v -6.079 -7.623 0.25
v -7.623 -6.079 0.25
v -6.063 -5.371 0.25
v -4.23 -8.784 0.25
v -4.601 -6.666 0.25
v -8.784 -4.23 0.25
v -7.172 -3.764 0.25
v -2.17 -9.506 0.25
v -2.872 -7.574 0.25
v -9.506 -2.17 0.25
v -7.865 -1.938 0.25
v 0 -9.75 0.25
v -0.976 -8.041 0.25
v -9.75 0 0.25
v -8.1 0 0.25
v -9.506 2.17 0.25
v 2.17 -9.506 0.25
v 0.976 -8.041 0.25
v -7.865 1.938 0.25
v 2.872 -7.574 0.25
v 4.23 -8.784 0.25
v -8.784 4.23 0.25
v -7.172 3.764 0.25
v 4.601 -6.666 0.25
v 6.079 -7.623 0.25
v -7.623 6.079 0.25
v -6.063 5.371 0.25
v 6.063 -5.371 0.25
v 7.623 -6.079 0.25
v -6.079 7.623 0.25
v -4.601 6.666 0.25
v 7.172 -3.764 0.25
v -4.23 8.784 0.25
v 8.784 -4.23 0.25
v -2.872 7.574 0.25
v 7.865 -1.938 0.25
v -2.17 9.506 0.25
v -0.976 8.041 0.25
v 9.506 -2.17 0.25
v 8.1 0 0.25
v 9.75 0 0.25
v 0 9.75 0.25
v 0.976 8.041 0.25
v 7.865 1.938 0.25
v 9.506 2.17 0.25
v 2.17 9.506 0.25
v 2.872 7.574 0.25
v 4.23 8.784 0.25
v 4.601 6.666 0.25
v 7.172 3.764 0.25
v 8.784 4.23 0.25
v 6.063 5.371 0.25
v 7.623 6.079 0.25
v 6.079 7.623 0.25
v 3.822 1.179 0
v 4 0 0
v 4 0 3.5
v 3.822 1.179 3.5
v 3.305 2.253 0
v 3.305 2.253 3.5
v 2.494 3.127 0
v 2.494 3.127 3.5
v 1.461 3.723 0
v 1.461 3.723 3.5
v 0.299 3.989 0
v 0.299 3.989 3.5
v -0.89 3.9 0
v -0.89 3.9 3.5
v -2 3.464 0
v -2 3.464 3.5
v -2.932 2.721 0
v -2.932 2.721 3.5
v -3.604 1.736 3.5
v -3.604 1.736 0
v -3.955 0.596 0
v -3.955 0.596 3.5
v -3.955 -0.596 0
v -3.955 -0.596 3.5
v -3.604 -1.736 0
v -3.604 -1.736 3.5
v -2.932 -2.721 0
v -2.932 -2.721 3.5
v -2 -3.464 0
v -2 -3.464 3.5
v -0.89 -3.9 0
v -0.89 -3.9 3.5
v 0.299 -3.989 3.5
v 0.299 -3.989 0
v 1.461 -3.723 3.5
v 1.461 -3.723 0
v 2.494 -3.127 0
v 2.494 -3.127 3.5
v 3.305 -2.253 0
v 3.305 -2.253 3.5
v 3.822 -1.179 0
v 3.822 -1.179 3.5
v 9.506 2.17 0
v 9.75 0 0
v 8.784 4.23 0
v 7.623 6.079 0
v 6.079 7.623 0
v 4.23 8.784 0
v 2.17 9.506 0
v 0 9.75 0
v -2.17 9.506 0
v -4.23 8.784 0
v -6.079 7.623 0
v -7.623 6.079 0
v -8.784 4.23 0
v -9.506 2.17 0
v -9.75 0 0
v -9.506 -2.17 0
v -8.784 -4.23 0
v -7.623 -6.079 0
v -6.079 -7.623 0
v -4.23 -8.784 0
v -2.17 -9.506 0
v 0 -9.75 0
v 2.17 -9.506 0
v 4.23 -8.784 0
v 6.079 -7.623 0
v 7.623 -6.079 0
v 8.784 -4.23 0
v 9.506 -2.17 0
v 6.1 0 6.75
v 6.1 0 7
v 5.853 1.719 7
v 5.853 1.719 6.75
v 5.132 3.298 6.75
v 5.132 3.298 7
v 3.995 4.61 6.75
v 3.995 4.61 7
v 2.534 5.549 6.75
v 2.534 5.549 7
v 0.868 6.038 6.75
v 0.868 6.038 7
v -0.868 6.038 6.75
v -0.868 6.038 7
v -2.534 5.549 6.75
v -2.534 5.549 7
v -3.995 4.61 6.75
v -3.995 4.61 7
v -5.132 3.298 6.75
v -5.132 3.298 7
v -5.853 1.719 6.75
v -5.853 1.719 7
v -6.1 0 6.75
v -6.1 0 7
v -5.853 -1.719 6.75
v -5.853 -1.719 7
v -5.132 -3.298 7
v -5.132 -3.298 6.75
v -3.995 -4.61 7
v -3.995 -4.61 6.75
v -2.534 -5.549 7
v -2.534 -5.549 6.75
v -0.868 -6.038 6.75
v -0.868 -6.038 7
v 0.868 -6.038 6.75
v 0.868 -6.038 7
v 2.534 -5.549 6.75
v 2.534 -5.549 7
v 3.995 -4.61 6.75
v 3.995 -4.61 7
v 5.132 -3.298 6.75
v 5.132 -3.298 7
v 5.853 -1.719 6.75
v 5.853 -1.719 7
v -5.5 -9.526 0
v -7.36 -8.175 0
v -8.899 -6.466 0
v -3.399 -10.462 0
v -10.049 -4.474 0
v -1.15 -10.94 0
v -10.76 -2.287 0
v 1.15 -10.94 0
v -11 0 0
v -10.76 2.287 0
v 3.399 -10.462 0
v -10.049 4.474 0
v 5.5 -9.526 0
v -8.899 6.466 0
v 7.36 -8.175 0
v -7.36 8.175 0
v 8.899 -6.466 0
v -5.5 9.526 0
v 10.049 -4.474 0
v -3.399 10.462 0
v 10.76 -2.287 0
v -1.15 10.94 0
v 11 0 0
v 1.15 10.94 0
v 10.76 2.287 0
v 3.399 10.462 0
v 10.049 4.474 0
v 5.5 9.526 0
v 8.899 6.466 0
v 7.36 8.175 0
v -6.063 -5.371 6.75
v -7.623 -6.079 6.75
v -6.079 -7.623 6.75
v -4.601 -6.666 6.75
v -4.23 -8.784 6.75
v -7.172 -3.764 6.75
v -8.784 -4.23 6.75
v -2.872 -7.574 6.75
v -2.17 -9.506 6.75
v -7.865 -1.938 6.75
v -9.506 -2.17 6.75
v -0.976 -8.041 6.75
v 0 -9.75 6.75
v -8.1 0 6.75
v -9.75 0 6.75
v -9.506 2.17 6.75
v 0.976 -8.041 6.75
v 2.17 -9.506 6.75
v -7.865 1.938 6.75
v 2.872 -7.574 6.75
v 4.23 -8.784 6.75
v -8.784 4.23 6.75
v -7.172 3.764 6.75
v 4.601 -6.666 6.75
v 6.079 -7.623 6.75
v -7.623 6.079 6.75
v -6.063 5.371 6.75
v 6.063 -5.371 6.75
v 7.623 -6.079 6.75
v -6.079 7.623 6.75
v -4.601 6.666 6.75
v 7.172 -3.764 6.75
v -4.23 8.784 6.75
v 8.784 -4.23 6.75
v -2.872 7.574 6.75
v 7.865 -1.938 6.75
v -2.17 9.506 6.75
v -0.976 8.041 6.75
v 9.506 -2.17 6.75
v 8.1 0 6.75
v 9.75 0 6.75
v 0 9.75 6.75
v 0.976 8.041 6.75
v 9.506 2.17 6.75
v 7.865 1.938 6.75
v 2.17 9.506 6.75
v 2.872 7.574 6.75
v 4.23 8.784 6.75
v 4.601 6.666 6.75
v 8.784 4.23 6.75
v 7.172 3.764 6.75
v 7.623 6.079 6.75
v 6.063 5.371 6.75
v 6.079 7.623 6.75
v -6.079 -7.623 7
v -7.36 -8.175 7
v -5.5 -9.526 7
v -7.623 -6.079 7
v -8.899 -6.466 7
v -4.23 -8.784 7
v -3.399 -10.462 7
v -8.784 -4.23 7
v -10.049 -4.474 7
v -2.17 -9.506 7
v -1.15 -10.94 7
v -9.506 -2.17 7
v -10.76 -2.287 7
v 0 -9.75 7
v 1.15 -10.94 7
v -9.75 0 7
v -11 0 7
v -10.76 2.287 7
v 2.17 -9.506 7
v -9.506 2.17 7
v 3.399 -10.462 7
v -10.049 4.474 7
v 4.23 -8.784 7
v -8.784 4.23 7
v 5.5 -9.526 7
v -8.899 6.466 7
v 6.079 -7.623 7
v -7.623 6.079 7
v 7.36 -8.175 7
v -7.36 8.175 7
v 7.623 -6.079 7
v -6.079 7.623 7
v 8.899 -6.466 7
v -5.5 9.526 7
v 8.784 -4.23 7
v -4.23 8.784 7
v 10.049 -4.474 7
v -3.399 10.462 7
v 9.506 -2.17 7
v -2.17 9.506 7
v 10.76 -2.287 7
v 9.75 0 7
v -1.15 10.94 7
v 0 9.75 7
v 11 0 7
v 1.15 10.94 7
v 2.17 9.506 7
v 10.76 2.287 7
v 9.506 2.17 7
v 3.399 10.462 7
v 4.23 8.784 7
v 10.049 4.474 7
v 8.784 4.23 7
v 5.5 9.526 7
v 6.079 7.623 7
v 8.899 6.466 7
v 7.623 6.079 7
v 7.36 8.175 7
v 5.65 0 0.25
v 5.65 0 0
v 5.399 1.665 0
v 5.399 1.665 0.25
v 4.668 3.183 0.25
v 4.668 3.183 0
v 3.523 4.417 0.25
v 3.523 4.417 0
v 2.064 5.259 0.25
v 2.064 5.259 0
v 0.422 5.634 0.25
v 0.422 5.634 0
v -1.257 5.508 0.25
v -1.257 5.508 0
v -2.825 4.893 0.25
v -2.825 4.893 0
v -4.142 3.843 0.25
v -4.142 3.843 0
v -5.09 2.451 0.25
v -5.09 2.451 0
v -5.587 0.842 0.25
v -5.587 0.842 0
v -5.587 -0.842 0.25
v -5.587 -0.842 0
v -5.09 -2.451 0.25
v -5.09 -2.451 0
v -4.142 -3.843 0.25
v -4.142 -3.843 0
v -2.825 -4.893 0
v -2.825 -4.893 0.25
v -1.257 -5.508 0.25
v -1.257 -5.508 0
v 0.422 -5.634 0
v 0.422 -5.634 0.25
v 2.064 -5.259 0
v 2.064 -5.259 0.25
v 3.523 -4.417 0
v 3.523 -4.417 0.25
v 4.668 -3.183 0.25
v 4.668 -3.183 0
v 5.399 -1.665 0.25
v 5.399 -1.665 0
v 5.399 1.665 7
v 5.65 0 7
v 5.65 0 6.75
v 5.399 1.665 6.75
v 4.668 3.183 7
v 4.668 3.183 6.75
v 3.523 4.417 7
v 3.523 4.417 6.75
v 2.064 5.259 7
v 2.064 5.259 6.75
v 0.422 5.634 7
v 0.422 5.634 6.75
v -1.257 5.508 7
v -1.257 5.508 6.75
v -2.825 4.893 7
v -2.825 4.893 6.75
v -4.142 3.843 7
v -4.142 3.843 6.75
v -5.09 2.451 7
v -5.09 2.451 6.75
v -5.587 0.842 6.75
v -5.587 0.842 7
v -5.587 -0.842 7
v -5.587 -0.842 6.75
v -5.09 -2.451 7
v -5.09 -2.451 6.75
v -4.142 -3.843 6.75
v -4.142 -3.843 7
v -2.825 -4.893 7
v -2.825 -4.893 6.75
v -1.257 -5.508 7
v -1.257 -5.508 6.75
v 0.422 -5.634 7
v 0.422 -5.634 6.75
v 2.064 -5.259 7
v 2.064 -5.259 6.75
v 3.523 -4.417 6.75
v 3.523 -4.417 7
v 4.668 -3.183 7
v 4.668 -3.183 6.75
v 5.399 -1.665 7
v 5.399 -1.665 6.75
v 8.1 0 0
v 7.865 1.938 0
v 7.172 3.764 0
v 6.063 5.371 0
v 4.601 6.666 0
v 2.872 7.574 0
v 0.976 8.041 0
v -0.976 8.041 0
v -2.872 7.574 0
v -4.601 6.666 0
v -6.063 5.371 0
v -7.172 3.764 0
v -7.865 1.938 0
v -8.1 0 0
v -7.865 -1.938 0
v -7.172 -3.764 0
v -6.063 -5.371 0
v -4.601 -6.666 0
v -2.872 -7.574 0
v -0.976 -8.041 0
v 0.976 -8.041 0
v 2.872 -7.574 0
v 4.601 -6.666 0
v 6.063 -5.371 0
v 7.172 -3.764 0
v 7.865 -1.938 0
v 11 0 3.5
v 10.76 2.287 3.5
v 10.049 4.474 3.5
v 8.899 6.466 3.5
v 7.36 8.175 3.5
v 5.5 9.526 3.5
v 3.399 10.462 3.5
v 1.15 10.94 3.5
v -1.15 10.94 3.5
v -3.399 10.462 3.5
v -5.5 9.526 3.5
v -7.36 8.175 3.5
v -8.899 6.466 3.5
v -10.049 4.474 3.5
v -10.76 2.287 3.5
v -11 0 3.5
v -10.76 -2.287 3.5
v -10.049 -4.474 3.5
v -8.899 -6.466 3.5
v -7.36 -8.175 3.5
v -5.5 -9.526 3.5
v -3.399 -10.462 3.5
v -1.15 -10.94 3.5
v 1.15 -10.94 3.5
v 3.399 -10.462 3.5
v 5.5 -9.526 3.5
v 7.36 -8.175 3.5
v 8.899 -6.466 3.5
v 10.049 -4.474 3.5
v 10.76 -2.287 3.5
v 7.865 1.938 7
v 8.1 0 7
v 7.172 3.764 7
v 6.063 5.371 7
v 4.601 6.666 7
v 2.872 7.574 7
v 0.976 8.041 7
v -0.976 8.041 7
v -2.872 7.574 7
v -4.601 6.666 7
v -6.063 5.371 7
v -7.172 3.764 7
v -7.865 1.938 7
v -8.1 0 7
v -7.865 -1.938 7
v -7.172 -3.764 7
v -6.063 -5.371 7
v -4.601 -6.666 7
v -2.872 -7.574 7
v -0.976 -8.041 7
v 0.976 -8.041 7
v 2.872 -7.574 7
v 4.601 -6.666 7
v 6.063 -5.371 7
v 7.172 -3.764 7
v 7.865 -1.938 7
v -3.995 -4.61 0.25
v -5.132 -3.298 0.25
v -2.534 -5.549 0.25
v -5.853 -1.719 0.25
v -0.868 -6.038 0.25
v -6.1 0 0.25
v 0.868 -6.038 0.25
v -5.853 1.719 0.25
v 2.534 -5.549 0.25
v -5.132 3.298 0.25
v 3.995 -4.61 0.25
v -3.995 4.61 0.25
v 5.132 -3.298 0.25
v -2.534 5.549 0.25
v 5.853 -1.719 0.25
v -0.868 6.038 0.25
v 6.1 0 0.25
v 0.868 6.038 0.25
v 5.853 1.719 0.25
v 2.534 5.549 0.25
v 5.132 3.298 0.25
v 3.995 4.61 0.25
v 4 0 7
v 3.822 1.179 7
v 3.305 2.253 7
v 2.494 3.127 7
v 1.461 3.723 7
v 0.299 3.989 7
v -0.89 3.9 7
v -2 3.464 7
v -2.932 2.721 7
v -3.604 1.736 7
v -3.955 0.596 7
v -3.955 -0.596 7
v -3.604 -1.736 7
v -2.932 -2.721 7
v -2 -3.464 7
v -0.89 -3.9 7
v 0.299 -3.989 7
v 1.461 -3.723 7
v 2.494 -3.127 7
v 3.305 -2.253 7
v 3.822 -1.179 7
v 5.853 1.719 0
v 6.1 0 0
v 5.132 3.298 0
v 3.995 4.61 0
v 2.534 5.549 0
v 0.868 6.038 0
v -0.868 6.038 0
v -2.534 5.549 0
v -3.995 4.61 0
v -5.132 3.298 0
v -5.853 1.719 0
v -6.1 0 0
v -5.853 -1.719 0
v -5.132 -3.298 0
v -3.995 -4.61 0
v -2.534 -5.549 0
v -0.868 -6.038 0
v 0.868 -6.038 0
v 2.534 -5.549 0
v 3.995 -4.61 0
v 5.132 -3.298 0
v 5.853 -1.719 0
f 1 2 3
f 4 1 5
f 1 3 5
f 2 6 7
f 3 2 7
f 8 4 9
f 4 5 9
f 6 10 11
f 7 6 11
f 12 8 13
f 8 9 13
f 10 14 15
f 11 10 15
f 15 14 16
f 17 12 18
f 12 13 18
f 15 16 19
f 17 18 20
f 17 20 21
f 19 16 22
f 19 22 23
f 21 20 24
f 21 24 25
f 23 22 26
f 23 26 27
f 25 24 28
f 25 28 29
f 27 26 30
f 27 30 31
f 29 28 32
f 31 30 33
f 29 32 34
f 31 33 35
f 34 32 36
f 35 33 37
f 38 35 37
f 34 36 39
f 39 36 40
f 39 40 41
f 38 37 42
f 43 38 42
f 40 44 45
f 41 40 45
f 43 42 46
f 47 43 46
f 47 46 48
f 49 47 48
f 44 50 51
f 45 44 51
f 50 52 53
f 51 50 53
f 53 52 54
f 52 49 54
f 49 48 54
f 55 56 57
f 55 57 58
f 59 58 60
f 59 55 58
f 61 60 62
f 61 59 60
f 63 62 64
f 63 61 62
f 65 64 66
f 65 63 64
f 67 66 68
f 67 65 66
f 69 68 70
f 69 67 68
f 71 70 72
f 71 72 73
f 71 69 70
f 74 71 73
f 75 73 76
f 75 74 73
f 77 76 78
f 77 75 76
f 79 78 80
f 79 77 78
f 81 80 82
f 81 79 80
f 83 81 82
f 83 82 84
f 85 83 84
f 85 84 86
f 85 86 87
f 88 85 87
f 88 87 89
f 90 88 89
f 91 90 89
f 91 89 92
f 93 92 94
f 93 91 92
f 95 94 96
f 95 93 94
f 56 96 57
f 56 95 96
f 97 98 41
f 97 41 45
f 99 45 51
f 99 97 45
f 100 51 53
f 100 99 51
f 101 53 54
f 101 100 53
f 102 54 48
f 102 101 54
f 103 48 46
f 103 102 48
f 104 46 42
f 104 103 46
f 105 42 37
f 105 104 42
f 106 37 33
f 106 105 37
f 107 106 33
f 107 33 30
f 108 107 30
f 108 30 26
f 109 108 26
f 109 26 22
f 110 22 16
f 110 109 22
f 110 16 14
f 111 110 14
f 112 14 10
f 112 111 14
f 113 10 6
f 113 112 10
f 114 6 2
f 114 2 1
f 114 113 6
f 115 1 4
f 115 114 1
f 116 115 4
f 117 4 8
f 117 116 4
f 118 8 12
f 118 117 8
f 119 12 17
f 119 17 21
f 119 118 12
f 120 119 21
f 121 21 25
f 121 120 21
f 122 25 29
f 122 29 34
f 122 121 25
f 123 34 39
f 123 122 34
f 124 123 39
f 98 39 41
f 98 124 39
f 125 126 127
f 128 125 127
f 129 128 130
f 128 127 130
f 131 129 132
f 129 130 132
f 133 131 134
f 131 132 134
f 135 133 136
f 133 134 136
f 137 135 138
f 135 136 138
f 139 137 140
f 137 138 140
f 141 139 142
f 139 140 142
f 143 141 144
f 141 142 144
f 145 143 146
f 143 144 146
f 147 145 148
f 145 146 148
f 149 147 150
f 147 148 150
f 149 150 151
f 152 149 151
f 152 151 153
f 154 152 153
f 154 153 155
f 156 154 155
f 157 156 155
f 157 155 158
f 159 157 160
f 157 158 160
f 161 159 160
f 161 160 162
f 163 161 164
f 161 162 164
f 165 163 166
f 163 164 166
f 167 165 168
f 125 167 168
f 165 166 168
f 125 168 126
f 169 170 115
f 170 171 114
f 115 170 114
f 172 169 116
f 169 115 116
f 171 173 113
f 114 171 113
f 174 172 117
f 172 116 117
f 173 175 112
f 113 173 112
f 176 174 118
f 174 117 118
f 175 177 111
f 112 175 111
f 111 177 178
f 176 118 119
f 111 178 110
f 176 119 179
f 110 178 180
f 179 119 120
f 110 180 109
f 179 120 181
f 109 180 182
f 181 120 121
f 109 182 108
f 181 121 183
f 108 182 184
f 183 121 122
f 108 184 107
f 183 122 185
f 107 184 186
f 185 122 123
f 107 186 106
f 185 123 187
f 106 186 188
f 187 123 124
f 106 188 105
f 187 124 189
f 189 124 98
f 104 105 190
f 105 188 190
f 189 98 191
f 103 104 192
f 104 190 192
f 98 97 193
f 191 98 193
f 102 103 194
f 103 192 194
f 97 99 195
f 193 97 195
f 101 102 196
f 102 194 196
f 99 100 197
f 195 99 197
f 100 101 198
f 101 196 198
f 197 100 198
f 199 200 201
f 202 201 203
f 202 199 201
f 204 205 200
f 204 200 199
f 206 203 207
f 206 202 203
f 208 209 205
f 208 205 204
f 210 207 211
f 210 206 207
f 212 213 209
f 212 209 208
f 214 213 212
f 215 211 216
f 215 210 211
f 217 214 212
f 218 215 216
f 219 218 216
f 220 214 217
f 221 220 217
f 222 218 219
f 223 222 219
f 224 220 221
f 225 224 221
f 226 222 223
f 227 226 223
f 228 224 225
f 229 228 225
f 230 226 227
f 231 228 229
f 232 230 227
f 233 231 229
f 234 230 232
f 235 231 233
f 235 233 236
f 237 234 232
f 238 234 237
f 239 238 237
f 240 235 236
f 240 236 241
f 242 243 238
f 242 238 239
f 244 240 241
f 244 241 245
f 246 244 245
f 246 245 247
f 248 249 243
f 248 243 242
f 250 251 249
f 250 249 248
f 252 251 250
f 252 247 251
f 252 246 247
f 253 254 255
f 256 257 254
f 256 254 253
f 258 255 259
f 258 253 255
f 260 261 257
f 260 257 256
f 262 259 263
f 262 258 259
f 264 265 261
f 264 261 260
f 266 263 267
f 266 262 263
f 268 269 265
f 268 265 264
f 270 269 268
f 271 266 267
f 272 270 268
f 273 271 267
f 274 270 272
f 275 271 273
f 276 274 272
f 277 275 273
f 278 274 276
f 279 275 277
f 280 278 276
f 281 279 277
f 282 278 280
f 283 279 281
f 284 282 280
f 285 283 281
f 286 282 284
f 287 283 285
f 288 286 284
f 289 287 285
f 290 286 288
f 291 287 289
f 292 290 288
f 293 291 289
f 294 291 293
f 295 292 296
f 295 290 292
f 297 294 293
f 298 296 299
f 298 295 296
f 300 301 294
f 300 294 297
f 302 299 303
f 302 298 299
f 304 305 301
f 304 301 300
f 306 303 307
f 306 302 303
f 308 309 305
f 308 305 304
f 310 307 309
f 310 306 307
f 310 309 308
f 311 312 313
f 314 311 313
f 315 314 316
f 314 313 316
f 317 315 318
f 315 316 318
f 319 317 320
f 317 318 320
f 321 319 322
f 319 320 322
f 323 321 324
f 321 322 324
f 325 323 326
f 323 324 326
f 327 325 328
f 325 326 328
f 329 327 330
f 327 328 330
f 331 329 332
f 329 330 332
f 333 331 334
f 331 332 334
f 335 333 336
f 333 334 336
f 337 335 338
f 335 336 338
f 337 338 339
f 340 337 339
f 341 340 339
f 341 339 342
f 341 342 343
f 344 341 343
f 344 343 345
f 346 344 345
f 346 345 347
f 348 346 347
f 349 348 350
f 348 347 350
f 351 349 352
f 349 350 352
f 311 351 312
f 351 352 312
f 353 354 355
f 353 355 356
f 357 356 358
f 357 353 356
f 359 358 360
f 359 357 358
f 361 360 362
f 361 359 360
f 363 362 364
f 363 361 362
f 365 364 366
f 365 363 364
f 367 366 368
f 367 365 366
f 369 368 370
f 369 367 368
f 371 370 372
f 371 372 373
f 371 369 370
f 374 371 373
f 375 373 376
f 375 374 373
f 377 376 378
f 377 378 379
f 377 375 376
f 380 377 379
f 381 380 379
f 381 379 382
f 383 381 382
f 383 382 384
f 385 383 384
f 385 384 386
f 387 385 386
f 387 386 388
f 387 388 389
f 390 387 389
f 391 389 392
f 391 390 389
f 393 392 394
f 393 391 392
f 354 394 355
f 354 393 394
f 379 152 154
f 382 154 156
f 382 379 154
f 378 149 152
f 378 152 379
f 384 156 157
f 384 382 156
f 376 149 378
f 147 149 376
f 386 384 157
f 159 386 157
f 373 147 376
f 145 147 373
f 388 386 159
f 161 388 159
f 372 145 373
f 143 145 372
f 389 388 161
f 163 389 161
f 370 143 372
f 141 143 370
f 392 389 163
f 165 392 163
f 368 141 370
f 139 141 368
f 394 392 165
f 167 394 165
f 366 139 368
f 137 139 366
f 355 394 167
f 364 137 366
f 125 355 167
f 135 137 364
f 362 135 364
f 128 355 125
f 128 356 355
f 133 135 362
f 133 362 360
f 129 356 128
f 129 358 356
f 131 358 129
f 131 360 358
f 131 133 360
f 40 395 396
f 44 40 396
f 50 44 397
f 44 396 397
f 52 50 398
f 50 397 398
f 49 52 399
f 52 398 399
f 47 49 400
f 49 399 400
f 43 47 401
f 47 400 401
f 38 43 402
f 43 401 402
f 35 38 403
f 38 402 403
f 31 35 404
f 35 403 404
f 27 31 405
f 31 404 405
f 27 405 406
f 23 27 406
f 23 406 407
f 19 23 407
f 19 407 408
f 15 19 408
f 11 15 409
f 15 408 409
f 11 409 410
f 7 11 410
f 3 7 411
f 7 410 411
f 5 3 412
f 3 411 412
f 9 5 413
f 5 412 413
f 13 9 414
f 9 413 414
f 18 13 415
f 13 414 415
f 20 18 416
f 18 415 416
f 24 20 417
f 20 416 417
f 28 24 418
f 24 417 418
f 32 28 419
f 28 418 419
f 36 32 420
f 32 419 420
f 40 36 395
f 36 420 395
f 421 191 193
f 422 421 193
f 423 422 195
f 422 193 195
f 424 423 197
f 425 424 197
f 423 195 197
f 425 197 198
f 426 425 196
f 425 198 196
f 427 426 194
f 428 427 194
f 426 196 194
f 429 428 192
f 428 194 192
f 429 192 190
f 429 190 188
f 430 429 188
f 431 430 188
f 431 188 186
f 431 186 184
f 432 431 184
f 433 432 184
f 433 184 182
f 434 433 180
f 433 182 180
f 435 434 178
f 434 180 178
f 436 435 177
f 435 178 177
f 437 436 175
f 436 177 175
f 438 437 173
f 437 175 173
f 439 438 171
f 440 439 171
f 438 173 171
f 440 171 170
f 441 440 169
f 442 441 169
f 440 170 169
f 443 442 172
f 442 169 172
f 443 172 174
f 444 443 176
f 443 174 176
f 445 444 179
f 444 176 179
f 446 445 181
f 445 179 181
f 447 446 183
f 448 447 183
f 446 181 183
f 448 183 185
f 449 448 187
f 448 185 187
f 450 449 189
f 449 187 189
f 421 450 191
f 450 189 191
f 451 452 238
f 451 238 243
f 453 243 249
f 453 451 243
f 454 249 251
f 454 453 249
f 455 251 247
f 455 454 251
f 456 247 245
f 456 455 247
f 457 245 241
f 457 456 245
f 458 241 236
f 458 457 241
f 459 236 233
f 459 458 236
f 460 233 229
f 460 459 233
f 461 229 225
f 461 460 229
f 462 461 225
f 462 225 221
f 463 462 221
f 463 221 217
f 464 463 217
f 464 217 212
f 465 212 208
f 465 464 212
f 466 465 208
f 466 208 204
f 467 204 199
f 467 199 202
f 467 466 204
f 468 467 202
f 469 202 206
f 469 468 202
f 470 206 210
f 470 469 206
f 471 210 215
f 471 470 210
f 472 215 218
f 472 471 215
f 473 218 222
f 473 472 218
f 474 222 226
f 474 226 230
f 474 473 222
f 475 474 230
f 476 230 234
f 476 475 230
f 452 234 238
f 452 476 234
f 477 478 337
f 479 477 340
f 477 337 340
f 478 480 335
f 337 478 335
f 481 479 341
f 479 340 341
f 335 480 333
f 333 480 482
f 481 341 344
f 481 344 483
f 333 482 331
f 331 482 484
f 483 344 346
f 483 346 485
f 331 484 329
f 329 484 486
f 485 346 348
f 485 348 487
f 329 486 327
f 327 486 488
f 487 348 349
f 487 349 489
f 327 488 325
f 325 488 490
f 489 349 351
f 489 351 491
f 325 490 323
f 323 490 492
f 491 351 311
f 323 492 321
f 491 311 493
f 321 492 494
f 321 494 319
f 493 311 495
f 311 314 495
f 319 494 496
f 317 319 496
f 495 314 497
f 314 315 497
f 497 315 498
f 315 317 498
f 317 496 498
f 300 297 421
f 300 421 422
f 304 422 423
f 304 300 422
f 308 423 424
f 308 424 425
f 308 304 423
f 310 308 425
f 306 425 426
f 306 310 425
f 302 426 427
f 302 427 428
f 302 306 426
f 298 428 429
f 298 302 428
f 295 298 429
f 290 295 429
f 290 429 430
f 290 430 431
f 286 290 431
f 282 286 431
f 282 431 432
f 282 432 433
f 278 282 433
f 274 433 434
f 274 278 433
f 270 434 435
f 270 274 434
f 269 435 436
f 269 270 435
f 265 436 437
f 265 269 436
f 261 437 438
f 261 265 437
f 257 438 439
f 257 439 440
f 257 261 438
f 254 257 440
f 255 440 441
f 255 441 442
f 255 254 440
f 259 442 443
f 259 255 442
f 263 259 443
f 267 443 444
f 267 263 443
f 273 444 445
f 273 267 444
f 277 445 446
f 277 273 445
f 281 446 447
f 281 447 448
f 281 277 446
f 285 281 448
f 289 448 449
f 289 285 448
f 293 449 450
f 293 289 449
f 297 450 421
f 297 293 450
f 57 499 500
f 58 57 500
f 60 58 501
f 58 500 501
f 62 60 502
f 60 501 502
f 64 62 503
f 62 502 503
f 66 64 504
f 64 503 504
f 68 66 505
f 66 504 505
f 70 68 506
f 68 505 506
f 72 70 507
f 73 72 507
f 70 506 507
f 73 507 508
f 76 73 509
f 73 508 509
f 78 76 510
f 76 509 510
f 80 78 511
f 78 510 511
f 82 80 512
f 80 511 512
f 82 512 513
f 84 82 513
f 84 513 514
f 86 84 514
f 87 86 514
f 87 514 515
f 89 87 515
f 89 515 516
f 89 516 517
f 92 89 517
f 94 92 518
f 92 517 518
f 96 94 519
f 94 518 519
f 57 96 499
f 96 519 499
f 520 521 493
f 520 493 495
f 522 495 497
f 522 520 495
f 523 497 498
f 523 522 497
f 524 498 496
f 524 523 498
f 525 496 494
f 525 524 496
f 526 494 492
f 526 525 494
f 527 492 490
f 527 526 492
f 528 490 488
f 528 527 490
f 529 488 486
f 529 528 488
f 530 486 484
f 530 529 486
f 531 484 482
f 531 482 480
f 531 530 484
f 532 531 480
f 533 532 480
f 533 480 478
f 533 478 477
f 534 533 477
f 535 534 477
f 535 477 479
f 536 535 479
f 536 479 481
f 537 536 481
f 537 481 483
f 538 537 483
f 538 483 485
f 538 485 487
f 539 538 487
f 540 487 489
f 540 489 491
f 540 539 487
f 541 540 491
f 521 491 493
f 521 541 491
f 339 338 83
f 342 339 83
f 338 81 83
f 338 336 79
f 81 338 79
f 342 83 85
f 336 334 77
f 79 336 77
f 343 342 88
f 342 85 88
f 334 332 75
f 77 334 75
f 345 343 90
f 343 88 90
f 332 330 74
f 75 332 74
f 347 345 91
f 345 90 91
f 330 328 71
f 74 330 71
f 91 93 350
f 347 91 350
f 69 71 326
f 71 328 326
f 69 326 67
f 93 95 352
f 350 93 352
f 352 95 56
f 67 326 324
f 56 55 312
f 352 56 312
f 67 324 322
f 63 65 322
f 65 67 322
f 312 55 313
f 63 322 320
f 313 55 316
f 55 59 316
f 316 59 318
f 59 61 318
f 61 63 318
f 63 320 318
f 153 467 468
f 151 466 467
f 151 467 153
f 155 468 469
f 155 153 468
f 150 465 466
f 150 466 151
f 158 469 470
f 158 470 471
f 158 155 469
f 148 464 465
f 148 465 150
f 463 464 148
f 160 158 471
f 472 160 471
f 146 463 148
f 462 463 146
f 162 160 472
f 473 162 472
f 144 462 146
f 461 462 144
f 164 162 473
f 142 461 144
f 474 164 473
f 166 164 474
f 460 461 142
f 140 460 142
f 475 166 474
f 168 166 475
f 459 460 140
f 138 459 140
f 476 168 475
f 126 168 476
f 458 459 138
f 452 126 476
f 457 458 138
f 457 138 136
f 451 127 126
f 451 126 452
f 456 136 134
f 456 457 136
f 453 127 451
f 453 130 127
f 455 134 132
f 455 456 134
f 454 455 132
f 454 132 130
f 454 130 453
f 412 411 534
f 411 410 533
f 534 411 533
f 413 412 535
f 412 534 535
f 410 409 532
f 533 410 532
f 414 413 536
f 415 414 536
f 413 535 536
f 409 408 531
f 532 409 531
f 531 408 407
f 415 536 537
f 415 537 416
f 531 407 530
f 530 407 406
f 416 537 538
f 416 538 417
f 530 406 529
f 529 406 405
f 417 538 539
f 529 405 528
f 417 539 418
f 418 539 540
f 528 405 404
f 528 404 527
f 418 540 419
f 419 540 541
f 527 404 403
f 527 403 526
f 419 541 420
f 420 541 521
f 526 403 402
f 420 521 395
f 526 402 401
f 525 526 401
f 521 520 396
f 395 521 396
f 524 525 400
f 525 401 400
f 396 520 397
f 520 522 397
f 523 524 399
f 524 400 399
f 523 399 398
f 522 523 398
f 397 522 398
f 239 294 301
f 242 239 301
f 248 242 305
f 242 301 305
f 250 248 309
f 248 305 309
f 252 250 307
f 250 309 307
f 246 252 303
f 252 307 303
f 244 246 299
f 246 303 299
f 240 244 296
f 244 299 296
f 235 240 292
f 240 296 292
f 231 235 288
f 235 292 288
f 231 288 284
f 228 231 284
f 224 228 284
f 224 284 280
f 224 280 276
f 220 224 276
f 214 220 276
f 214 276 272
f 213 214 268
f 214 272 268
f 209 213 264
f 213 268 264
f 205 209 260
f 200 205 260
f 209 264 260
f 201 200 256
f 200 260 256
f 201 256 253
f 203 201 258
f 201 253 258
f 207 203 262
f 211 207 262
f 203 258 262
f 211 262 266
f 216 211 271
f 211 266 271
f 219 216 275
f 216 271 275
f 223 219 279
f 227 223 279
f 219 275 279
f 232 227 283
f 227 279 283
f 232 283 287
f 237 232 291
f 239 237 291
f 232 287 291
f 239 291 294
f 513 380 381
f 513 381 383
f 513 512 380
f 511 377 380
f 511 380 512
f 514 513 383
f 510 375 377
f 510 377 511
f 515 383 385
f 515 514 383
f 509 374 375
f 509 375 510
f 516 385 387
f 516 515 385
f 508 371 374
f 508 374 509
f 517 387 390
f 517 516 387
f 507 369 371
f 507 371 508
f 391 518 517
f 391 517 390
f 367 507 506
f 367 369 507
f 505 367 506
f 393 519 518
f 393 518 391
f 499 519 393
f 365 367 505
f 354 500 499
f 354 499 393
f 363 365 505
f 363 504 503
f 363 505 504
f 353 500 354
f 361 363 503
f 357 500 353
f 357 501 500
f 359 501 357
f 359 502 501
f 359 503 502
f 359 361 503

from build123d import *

# Parameters (mm, degrees)
F0_R     = 11
F0_R_2   = 9.75
F0_R_3   = 8.1
F0_R_4   = 6.1
F0_R_5   = 5.65
F0_R_6   = 4
F1_DEPTH = 3.5
F2_DEPTH = 0.25


with BuildPart() as f1:
    # F0 (on Top) → F1 (new body)
    with BuildSketch(Plane.XY):
        Circle(F0_R)
        Circle(F0_R_2, mode=Mode.SUBTRACT)
        Circle(F0_R_2)
        Circle(F0_R_3, mode=Mode.SUBTRACT)
        Circle(F0_R_3)
        Circle(F0_R_4, mode=Mode.SUBTRACT)
        Circle(F0_R_4)
        Circle(F0_R_5, mode=Mode.SUBTRACT)
        Circle(F0_R_5)
        Circle(F0_R_6, mode=Mode.SUBTRACT)
    extrude(amount=F1_DEPTH)

    # F0 (on Top) → F2 (cut)
    with BuildSketch(Plane.XY):
        Circle(F0_R_2)
        Circle(F0_R_3, mode=Mode.SUBTRACT)
        Circle(F0_R_4)
        Circle(F0_R_5, mode=Mode.SUBTRACT)
    extrude(amount=F2_DEPTH, mode=Mode.SUBTRACT)

    # F3: F1 across face


with BuildPart() as f1_1:
    add(f1.part)
    add(f1.part.mirror(Plane.XY.offset(3.5)))


solid = f1_1.part
